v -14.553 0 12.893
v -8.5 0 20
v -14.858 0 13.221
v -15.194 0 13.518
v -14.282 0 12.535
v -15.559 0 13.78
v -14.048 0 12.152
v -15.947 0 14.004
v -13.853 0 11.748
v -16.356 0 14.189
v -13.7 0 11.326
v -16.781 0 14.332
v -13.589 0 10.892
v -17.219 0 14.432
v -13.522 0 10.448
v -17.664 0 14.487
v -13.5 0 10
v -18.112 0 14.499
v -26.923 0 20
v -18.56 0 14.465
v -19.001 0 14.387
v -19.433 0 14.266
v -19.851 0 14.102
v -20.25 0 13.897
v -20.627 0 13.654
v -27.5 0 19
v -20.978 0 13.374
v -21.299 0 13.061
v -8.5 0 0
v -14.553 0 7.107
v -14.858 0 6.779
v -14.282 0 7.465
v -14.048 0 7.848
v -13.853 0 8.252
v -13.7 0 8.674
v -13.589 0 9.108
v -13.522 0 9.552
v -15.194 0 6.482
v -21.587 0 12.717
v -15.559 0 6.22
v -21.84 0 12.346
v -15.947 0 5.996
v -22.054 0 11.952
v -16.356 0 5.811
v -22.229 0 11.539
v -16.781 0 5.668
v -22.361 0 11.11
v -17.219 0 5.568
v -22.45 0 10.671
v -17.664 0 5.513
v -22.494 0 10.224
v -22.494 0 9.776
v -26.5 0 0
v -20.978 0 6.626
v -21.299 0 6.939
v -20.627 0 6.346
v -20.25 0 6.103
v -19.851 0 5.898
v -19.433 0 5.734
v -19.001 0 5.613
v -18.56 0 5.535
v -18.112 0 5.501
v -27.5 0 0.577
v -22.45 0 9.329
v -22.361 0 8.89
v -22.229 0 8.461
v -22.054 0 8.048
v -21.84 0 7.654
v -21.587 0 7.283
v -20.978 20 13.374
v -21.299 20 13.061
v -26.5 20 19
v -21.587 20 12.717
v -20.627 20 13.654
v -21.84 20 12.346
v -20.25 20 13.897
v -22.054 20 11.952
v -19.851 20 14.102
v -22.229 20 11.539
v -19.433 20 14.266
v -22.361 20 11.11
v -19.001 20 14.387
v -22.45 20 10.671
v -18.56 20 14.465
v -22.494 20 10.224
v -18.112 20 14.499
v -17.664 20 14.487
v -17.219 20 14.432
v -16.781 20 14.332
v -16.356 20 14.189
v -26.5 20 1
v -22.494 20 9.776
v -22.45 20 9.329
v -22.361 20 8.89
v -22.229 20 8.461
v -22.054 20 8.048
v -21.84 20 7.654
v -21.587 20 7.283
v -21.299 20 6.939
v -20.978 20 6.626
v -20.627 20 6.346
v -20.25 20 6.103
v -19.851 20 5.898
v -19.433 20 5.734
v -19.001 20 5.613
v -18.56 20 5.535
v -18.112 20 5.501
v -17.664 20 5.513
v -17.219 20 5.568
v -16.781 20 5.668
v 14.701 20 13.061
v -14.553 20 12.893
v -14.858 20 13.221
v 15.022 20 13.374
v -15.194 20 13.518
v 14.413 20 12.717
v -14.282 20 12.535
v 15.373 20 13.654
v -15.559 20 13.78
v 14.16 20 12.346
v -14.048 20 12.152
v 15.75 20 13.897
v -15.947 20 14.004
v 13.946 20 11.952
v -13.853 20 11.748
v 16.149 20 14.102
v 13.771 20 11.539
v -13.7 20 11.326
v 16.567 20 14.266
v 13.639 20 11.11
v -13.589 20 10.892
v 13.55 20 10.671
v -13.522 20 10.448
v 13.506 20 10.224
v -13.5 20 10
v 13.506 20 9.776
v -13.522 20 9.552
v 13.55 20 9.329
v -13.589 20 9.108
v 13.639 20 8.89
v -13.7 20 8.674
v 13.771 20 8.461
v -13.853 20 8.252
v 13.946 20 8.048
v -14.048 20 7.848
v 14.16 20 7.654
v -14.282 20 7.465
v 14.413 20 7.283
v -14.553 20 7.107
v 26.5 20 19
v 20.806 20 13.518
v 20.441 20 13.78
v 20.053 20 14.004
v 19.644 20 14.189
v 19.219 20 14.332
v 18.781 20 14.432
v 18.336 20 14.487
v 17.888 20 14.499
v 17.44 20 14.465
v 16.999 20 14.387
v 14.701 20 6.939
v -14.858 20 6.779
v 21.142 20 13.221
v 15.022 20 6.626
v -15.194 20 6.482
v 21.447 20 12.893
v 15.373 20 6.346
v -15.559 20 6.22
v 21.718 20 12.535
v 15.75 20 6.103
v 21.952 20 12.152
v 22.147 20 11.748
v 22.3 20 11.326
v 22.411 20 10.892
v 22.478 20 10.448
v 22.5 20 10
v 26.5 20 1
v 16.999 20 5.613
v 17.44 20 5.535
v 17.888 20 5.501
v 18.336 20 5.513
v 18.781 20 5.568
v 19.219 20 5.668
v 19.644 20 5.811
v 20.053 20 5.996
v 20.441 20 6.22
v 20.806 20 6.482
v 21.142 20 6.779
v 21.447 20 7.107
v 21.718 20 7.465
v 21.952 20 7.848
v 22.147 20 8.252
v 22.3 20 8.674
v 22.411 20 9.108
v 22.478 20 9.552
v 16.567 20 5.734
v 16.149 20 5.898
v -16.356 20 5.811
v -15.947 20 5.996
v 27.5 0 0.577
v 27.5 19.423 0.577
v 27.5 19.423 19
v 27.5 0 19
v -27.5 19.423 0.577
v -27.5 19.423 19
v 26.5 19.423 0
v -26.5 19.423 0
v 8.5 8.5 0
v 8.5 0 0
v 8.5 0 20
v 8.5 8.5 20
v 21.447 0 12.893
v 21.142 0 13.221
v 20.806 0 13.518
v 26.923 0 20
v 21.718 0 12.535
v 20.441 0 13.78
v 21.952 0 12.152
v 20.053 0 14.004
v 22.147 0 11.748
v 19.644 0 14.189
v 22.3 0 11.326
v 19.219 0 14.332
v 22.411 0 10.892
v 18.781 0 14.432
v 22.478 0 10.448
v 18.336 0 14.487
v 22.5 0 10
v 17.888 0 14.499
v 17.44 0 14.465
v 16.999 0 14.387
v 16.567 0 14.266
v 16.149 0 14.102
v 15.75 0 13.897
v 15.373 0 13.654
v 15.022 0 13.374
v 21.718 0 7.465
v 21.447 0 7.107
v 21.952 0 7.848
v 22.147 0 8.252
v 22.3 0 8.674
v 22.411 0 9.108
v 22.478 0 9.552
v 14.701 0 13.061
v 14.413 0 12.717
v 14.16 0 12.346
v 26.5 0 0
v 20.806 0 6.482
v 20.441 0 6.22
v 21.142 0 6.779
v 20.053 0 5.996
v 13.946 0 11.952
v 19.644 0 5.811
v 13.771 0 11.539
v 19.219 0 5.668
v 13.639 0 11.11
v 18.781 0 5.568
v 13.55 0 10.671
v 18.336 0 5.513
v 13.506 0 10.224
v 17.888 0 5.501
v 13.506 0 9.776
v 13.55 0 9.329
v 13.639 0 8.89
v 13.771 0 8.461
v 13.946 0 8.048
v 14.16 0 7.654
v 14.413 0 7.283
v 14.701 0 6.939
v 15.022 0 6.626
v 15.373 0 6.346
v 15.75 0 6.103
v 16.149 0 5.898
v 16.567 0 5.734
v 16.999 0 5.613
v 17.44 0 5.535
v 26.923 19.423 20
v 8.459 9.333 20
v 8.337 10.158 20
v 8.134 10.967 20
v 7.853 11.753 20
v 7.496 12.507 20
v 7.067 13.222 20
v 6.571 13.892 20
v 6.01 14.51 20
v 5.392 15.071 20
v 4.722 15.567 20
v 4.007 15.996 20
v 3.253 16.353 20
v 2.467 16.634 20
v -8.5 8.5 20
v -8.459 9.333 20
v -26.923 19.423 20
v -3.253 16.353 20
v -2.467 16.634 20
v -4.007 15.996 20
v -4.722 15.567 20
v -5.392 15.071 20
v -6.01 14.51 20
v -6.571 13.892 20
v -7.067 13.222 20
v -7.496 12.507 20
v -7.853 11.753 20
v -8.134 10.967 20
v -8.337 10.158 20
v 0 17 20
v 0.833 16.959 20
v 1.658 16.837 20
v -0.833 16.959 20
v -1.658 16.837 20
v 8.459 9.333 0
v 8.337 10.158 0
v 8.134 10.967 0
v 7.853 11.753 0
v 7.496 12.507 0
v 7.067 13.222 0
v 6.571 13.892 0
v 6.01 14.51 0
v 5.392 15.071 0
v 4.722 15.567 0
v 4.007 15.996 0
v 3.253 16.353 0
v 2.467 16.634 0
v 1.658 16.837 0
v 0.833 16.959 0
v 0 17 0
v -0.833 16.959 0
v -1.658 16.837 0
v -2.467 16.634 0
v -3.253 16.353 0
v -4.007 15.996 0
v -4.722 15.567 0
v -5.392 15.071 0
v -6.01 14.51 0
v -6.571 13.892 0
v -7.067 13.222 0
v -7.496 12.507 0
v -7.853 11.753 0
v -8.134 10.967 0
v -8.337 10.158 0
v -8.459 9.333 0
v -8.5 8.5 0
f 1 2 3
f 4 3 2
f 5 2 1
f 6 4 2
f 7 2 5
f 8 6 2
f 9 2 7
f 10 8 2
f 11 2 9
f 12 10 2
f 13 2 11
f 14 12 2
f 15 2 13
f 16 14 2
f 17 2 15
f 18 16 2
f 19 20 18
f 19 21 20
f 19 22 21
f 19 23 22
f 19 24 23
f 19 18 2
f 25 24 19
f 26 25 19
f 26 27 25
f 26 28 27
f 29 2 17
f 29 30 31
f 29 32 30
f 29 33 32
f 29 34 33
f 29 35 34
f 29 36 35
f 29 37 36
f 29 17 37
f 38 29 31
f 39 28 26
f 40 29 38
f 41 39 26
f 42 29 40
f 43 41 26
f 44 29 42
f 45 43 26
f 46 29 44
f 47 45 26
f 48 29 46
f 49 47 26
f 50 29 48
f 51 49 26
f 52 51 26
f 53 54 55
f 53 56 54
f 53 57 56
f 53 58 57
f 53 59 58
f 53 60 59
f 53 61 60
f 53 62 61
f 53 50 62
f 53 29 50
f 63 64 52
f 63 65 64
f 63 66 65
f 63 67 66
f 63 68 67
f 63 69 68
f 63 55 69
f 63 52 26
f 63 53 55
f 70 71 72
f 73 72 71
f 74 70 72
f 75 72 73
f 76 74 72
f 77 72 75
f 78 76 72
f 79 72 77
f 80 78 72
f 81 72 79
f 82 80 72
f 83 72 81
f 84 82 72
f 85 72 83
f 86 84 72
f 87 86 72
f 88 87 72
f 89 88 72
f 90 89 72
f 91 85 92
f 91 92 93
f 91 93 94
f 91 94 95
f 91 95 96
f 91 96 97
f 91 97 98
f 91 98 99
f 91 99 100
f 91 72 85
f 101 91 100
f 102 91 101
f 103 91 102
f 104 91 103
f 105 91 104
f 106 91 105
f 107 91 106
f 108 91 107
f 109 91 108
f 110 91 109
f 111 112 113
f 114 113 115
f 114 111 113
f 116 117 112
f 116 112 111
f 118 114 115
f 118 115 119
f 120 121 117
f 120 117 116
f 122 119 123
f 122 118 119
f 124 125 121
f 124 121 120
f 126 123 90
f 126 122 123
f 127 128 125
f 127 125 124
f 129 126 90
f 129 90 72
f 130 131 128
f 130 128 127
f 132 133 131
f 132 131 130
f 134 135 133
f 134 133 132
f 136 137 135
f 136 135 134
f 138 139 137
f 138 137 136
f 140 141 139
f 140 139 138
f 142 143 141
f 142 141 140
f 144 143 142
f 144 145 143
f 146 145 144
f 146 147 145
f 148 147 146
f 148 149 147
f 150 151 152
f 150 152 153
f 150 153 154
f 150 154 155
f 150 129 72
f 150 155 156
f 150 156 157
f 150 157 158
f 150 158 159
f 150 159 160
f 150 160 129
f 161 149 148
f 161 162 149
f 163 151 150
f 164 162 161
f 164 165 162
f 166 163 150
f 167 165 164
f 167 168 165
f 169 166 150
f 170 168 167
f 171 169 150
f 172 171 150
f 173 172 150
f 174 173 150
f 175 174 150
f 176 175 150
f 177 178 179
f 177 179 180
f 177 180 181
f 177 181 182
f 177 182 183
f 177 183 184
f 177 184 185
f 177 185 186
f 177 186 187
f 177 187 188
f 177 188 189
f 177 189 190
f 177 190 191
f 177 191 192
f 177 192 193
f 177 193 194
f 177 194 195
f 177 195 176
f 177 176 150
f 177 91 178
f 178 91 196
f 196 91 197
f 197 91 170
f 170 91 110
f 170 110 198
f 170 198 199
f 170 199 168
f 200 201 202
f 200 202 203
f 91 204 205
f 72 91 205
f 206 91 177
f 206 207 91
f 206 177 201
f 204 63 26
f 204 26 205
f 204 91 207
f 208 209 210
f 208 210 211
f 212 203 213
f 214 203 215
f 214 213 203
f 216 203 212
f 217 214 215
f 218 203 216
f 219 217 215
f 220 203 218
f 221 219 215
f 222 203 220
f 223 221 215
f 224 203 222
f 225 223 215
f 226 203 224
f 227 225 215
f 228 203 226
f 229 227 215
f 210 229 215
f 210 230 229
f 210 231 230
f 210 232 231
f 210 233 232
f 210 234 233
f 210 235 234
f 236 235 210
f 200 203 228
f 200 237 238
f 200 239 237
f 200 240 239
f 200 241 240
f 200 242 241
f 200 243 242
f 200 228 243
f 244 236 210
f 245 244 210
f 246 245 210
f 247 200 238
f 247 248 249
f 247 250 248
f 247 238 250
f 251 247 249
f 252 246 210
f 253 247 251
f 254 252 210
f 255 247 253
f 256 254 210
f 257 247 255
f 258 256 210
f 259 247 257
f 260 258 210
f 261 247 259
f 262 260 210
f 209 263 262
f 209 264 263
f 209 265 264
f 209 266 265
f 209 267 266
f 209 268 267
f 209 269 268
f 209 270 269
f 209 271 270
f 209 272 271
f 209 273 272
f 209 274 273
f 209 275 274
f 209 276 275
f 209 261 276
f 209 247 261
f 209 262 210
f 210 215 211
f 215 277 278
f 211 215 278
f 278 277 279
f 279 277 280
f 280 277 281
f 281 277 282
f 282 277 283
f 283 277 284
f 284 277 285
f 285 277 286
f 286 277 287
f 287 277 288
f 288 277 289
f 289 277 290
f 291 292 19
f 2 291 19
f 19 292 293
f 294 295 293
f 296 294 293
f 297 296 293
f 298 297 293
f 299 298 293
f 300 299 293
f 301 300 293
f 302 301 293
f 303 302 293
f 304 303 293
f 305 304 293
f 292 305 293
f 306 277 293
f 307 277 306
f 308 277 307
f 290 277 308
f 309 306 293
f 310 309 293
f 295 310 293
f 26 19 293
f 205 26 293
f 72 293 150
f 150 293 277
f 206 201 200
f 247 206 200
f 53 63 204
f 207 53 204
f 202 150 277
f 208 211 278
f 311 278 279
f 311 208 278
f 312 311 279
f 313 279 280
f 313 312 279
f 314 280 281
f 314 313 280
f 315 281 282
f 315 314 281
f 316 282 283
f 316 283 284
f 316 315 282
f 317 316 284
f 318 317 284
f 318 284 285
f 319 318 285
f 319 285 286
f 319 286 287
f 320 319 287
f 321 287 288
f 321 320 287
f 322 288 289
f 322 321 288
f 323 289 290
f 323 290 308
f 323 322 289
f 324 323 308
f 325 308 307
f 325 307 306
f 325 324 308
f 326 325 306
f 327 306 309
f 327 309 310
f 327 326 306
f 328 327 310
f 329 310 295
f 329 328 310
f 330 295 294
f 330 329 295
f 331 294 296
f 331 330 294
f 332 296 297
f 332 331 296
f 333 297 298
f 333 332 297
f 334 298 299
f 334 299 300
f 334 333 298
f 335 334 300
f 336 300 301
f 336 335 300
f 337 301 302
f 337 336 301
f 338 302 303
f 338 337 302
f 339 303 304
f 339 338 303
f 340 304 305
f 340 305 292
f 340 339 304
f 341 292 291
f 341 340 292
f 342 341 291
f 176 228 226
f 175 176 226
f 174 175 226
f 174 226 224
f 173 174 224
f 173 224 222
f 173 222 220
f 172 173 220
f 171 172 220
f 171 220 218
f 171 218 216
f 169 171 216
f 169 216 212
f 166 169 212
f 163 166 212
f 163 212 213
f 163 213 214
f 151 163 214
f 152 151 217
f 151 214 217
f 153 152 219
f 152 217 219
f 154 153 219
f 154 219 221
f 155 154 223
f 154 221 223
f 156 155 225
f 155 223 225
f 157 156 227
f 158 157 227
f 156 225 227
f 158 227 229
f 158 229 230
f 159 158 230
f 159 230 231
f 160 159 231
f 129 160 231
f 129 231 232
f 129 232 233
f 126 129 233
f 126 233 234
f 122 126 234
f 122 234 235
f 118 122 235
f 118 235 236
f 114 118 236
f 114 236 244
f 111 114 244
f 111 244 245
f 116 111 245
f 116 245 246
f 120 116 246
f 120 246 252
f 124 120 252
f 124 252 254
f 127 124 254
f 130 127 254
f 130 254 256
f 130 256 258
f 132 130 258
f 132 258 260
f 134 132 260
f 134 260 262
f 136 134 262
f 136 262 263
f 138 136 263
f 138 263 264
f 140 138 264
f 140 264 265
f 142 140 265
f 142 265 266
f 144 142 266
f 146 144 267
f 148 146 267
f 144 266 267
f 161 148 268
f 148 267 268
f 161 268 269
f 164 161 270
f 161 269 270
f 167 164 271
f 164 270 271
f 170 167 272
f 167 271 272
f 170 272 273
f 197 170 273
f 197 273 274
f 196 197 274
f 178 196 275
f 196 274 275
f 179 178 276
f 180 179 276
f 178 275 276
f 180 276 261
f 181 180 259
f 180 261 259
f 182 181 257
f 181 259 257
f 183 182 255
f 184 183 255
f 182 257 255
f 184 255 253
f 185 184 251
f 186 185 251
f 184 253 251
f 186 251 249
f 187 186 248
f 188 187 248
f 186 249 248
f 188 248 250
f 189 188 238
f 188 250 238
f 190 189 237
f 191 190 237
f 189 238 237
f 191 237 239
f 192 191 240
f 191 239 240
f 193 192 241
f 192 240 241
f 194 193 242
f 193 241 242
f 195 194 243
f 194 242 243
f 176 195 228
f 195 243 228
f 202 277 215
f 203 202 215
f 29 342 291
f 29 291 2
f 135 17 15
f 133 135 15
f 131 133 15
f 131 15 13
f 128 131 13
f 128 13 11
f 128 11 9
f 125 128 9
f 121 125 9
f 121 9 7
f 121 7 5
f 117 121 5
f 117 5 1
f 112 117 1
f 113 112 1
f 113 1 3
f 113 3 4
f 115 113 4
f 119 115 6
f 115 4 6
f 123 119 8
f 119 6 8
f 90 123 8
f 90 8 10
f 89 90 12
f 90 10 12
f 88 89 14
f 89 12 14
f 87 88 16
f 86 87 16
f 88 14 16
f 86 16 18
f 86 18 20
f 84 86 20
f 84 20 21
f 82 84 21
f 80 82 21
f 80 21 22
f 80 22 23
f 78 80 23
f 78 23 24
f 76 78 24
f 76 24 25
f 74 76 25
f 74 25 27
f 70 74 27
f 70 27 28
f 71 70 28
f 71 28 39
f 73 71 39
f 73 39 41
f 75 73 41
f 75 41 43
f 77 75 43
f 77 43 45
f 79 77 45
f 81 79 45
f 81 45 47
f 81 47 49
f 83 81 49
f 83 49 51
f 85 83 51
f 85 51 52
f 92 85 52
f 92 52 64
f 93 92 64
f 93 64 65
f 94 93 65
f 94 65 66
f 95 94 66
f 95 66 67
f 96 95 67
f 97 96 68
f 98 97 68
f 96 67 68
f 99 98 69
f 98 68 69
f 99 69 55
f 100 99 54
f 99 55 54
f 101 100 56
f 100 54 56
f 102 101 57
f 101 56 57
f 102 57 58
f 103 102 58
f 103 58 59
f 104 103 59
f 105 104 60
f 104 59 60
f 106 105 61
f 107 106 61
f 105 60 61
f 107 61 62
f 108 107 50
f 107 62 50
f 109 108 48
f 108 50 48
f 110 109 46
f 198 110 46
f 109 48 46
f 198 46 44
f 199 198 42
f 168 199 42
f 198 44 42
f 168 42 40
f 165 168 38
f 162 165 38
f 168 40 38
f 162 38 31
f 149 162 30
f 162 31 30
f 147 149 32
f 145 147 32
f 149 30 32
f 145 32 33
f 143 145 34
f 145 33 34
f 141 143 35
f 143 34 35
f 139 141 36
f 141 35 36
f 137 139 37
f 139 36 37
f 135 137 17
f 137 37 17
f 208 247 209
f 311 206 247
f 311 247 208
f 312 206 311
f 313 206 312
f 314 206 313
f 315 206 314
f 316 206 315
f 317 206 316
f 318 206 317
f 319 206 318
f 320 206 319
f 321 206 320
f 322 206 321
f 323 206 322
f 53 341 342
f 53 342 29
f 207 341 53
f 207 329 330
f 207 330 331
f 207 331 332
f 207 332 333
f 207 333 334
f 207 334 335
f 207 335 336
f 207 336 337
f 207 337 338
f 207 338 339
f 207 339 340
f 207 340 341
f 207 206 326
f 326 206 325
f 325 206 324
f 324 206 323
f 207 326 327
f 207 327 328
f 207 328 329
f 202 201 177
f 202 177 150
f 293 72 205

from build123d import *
from OCP.BRepFilletAPI import BRepFilletAPI_MakeChamfer

# Parameters (mm, degrees)
ESTRUSIONE_ESTRUSIONE1_DEPTH = 20
SCHIZZO2_R                   = 4.5
TAGLIO_ESTRUSIONE1_DEPTH     = 40.449334595
SMUSSO1_SIZE                 = 1
SMUSSO1_SIZE2                = 0.577350269


with BuildPart() as part:
    # Schizzo1 → Estrusione-Estrusione1 (new body)
    with BuildSketch(Plane.XY):
        with BuildLine():
            Line((-8.5, 8.5), (-8.5, 0))
            Line((-8.5, 0), (-27.5, 0))
            Line((-27.5, 0), (-27.5, 20))
            Line((-27.5, 20), (27.5, 20))
            Line((27.5, 20), (27.5, 0))
            Line((27.5, 0), (8.5, 0))
            Line((8.5, 0), (8.5, 8.5))
            ThreePointArc((8.5, 8.5), (0, 17), (-8.5, 8.5))
        make_face()
    extrude(amount=ESTRUSIONE_ESTRUSIONE1_DEPTH)

    # Schizzo2 → Taglio-Estrusione1 (cut, through all)
    with BuildSketch(Plane.XZ):
        with Locations((-18, 10)):
            Circle(SCHIZZO2_R)
        with Locations((18, 10)):
            Circle(SCHIZZO2_R)
    extrude(amount=-TAGLIO_ESTRUSIONE1_DEPTH, mode=Mode.SUBTRACT)

    # Smusso1: one chamfer whose edges measure the first distance from different faces: ONE call of the kernel's chamfer builder (chamfer() names one face for all edges)
    smusso1_edges_1 = [part.edges().sort_by_distance(p)[0] for p in [
        (-27.5, 10, 20),
    ]]
    smusso1_side_1 = [part.faces().sort_by_distance(p)[0] for p in [
        (-27.5, 10, 10),
    ]]
    smusso1_edges_2 = [part.edges().sort_by_distance(p)[0] for p in [
        (0, 20, 0),
        (-27.5, 20, 10),
        (27.5, 20, 10),
        (0, 20, 20),
    ]]
    smusso1_side_2 = [part.faces().sort_by_distance(p)[0] for p in [
        (0, 20, 10),
    ]]
    smusso1_edges_3 = [part.edges().sort_by_distance(p)[0] for p in [
        (27.5, 10, 0),
        (-27.5, 10, 0),
    ]]
    smusso1_side_3 = [part.faces().sort_by_distance(p)[0] for p in [
        (-9.085234996, 4.25, 0),
    ]]
    smusso1_edges_4 = [part.edges().sort_by_distance(p)[0] for p in [
        (27.5, 10, 20),
    ]]
    smusso1_side_4 = [part.faces().sort_by_distance(p)[0] for p in [
        (27.5, 10, 10),
    ]]
    smusso1 = BRepFilletAPI_MakeChamfer(part.part.solid().wrapped)
    for e in smusso1_edges_1:
        smusso1.Add(SMUSSO1_SIZE, SMUSSO1_SIZE2, e.wrapped, smusso1_side_1[0].wrapped)  # the first distance lies on this face
    for e in smusso1_edges_2:
        smusso1.Add(SMUSSO1_SIZE, SMUSSO1_SIZE2, e.wrapped, smusso1_side_2[0].wrapped)  # the first distance lies on this face
    for e in smusso1_edges_3:
        smusso1.Add(SMUSSO1_SIZE, SMUSSO1_SIZE2, e.wrapped, smusso1_side_3[0].wrapped)  # the first distance lies on this face
    for e in smusso1_edges_4:
        smusso1.Add(SMUSSO1_SIZE, SMUSSO1_SIZE2, e.wrapped, smusso1_side_4[0].wrapped)  # the first distance lies on this face
    add(Compound.cast(smusso1.Shape()), mode=Mode.REPLACE)


solid = part.part
